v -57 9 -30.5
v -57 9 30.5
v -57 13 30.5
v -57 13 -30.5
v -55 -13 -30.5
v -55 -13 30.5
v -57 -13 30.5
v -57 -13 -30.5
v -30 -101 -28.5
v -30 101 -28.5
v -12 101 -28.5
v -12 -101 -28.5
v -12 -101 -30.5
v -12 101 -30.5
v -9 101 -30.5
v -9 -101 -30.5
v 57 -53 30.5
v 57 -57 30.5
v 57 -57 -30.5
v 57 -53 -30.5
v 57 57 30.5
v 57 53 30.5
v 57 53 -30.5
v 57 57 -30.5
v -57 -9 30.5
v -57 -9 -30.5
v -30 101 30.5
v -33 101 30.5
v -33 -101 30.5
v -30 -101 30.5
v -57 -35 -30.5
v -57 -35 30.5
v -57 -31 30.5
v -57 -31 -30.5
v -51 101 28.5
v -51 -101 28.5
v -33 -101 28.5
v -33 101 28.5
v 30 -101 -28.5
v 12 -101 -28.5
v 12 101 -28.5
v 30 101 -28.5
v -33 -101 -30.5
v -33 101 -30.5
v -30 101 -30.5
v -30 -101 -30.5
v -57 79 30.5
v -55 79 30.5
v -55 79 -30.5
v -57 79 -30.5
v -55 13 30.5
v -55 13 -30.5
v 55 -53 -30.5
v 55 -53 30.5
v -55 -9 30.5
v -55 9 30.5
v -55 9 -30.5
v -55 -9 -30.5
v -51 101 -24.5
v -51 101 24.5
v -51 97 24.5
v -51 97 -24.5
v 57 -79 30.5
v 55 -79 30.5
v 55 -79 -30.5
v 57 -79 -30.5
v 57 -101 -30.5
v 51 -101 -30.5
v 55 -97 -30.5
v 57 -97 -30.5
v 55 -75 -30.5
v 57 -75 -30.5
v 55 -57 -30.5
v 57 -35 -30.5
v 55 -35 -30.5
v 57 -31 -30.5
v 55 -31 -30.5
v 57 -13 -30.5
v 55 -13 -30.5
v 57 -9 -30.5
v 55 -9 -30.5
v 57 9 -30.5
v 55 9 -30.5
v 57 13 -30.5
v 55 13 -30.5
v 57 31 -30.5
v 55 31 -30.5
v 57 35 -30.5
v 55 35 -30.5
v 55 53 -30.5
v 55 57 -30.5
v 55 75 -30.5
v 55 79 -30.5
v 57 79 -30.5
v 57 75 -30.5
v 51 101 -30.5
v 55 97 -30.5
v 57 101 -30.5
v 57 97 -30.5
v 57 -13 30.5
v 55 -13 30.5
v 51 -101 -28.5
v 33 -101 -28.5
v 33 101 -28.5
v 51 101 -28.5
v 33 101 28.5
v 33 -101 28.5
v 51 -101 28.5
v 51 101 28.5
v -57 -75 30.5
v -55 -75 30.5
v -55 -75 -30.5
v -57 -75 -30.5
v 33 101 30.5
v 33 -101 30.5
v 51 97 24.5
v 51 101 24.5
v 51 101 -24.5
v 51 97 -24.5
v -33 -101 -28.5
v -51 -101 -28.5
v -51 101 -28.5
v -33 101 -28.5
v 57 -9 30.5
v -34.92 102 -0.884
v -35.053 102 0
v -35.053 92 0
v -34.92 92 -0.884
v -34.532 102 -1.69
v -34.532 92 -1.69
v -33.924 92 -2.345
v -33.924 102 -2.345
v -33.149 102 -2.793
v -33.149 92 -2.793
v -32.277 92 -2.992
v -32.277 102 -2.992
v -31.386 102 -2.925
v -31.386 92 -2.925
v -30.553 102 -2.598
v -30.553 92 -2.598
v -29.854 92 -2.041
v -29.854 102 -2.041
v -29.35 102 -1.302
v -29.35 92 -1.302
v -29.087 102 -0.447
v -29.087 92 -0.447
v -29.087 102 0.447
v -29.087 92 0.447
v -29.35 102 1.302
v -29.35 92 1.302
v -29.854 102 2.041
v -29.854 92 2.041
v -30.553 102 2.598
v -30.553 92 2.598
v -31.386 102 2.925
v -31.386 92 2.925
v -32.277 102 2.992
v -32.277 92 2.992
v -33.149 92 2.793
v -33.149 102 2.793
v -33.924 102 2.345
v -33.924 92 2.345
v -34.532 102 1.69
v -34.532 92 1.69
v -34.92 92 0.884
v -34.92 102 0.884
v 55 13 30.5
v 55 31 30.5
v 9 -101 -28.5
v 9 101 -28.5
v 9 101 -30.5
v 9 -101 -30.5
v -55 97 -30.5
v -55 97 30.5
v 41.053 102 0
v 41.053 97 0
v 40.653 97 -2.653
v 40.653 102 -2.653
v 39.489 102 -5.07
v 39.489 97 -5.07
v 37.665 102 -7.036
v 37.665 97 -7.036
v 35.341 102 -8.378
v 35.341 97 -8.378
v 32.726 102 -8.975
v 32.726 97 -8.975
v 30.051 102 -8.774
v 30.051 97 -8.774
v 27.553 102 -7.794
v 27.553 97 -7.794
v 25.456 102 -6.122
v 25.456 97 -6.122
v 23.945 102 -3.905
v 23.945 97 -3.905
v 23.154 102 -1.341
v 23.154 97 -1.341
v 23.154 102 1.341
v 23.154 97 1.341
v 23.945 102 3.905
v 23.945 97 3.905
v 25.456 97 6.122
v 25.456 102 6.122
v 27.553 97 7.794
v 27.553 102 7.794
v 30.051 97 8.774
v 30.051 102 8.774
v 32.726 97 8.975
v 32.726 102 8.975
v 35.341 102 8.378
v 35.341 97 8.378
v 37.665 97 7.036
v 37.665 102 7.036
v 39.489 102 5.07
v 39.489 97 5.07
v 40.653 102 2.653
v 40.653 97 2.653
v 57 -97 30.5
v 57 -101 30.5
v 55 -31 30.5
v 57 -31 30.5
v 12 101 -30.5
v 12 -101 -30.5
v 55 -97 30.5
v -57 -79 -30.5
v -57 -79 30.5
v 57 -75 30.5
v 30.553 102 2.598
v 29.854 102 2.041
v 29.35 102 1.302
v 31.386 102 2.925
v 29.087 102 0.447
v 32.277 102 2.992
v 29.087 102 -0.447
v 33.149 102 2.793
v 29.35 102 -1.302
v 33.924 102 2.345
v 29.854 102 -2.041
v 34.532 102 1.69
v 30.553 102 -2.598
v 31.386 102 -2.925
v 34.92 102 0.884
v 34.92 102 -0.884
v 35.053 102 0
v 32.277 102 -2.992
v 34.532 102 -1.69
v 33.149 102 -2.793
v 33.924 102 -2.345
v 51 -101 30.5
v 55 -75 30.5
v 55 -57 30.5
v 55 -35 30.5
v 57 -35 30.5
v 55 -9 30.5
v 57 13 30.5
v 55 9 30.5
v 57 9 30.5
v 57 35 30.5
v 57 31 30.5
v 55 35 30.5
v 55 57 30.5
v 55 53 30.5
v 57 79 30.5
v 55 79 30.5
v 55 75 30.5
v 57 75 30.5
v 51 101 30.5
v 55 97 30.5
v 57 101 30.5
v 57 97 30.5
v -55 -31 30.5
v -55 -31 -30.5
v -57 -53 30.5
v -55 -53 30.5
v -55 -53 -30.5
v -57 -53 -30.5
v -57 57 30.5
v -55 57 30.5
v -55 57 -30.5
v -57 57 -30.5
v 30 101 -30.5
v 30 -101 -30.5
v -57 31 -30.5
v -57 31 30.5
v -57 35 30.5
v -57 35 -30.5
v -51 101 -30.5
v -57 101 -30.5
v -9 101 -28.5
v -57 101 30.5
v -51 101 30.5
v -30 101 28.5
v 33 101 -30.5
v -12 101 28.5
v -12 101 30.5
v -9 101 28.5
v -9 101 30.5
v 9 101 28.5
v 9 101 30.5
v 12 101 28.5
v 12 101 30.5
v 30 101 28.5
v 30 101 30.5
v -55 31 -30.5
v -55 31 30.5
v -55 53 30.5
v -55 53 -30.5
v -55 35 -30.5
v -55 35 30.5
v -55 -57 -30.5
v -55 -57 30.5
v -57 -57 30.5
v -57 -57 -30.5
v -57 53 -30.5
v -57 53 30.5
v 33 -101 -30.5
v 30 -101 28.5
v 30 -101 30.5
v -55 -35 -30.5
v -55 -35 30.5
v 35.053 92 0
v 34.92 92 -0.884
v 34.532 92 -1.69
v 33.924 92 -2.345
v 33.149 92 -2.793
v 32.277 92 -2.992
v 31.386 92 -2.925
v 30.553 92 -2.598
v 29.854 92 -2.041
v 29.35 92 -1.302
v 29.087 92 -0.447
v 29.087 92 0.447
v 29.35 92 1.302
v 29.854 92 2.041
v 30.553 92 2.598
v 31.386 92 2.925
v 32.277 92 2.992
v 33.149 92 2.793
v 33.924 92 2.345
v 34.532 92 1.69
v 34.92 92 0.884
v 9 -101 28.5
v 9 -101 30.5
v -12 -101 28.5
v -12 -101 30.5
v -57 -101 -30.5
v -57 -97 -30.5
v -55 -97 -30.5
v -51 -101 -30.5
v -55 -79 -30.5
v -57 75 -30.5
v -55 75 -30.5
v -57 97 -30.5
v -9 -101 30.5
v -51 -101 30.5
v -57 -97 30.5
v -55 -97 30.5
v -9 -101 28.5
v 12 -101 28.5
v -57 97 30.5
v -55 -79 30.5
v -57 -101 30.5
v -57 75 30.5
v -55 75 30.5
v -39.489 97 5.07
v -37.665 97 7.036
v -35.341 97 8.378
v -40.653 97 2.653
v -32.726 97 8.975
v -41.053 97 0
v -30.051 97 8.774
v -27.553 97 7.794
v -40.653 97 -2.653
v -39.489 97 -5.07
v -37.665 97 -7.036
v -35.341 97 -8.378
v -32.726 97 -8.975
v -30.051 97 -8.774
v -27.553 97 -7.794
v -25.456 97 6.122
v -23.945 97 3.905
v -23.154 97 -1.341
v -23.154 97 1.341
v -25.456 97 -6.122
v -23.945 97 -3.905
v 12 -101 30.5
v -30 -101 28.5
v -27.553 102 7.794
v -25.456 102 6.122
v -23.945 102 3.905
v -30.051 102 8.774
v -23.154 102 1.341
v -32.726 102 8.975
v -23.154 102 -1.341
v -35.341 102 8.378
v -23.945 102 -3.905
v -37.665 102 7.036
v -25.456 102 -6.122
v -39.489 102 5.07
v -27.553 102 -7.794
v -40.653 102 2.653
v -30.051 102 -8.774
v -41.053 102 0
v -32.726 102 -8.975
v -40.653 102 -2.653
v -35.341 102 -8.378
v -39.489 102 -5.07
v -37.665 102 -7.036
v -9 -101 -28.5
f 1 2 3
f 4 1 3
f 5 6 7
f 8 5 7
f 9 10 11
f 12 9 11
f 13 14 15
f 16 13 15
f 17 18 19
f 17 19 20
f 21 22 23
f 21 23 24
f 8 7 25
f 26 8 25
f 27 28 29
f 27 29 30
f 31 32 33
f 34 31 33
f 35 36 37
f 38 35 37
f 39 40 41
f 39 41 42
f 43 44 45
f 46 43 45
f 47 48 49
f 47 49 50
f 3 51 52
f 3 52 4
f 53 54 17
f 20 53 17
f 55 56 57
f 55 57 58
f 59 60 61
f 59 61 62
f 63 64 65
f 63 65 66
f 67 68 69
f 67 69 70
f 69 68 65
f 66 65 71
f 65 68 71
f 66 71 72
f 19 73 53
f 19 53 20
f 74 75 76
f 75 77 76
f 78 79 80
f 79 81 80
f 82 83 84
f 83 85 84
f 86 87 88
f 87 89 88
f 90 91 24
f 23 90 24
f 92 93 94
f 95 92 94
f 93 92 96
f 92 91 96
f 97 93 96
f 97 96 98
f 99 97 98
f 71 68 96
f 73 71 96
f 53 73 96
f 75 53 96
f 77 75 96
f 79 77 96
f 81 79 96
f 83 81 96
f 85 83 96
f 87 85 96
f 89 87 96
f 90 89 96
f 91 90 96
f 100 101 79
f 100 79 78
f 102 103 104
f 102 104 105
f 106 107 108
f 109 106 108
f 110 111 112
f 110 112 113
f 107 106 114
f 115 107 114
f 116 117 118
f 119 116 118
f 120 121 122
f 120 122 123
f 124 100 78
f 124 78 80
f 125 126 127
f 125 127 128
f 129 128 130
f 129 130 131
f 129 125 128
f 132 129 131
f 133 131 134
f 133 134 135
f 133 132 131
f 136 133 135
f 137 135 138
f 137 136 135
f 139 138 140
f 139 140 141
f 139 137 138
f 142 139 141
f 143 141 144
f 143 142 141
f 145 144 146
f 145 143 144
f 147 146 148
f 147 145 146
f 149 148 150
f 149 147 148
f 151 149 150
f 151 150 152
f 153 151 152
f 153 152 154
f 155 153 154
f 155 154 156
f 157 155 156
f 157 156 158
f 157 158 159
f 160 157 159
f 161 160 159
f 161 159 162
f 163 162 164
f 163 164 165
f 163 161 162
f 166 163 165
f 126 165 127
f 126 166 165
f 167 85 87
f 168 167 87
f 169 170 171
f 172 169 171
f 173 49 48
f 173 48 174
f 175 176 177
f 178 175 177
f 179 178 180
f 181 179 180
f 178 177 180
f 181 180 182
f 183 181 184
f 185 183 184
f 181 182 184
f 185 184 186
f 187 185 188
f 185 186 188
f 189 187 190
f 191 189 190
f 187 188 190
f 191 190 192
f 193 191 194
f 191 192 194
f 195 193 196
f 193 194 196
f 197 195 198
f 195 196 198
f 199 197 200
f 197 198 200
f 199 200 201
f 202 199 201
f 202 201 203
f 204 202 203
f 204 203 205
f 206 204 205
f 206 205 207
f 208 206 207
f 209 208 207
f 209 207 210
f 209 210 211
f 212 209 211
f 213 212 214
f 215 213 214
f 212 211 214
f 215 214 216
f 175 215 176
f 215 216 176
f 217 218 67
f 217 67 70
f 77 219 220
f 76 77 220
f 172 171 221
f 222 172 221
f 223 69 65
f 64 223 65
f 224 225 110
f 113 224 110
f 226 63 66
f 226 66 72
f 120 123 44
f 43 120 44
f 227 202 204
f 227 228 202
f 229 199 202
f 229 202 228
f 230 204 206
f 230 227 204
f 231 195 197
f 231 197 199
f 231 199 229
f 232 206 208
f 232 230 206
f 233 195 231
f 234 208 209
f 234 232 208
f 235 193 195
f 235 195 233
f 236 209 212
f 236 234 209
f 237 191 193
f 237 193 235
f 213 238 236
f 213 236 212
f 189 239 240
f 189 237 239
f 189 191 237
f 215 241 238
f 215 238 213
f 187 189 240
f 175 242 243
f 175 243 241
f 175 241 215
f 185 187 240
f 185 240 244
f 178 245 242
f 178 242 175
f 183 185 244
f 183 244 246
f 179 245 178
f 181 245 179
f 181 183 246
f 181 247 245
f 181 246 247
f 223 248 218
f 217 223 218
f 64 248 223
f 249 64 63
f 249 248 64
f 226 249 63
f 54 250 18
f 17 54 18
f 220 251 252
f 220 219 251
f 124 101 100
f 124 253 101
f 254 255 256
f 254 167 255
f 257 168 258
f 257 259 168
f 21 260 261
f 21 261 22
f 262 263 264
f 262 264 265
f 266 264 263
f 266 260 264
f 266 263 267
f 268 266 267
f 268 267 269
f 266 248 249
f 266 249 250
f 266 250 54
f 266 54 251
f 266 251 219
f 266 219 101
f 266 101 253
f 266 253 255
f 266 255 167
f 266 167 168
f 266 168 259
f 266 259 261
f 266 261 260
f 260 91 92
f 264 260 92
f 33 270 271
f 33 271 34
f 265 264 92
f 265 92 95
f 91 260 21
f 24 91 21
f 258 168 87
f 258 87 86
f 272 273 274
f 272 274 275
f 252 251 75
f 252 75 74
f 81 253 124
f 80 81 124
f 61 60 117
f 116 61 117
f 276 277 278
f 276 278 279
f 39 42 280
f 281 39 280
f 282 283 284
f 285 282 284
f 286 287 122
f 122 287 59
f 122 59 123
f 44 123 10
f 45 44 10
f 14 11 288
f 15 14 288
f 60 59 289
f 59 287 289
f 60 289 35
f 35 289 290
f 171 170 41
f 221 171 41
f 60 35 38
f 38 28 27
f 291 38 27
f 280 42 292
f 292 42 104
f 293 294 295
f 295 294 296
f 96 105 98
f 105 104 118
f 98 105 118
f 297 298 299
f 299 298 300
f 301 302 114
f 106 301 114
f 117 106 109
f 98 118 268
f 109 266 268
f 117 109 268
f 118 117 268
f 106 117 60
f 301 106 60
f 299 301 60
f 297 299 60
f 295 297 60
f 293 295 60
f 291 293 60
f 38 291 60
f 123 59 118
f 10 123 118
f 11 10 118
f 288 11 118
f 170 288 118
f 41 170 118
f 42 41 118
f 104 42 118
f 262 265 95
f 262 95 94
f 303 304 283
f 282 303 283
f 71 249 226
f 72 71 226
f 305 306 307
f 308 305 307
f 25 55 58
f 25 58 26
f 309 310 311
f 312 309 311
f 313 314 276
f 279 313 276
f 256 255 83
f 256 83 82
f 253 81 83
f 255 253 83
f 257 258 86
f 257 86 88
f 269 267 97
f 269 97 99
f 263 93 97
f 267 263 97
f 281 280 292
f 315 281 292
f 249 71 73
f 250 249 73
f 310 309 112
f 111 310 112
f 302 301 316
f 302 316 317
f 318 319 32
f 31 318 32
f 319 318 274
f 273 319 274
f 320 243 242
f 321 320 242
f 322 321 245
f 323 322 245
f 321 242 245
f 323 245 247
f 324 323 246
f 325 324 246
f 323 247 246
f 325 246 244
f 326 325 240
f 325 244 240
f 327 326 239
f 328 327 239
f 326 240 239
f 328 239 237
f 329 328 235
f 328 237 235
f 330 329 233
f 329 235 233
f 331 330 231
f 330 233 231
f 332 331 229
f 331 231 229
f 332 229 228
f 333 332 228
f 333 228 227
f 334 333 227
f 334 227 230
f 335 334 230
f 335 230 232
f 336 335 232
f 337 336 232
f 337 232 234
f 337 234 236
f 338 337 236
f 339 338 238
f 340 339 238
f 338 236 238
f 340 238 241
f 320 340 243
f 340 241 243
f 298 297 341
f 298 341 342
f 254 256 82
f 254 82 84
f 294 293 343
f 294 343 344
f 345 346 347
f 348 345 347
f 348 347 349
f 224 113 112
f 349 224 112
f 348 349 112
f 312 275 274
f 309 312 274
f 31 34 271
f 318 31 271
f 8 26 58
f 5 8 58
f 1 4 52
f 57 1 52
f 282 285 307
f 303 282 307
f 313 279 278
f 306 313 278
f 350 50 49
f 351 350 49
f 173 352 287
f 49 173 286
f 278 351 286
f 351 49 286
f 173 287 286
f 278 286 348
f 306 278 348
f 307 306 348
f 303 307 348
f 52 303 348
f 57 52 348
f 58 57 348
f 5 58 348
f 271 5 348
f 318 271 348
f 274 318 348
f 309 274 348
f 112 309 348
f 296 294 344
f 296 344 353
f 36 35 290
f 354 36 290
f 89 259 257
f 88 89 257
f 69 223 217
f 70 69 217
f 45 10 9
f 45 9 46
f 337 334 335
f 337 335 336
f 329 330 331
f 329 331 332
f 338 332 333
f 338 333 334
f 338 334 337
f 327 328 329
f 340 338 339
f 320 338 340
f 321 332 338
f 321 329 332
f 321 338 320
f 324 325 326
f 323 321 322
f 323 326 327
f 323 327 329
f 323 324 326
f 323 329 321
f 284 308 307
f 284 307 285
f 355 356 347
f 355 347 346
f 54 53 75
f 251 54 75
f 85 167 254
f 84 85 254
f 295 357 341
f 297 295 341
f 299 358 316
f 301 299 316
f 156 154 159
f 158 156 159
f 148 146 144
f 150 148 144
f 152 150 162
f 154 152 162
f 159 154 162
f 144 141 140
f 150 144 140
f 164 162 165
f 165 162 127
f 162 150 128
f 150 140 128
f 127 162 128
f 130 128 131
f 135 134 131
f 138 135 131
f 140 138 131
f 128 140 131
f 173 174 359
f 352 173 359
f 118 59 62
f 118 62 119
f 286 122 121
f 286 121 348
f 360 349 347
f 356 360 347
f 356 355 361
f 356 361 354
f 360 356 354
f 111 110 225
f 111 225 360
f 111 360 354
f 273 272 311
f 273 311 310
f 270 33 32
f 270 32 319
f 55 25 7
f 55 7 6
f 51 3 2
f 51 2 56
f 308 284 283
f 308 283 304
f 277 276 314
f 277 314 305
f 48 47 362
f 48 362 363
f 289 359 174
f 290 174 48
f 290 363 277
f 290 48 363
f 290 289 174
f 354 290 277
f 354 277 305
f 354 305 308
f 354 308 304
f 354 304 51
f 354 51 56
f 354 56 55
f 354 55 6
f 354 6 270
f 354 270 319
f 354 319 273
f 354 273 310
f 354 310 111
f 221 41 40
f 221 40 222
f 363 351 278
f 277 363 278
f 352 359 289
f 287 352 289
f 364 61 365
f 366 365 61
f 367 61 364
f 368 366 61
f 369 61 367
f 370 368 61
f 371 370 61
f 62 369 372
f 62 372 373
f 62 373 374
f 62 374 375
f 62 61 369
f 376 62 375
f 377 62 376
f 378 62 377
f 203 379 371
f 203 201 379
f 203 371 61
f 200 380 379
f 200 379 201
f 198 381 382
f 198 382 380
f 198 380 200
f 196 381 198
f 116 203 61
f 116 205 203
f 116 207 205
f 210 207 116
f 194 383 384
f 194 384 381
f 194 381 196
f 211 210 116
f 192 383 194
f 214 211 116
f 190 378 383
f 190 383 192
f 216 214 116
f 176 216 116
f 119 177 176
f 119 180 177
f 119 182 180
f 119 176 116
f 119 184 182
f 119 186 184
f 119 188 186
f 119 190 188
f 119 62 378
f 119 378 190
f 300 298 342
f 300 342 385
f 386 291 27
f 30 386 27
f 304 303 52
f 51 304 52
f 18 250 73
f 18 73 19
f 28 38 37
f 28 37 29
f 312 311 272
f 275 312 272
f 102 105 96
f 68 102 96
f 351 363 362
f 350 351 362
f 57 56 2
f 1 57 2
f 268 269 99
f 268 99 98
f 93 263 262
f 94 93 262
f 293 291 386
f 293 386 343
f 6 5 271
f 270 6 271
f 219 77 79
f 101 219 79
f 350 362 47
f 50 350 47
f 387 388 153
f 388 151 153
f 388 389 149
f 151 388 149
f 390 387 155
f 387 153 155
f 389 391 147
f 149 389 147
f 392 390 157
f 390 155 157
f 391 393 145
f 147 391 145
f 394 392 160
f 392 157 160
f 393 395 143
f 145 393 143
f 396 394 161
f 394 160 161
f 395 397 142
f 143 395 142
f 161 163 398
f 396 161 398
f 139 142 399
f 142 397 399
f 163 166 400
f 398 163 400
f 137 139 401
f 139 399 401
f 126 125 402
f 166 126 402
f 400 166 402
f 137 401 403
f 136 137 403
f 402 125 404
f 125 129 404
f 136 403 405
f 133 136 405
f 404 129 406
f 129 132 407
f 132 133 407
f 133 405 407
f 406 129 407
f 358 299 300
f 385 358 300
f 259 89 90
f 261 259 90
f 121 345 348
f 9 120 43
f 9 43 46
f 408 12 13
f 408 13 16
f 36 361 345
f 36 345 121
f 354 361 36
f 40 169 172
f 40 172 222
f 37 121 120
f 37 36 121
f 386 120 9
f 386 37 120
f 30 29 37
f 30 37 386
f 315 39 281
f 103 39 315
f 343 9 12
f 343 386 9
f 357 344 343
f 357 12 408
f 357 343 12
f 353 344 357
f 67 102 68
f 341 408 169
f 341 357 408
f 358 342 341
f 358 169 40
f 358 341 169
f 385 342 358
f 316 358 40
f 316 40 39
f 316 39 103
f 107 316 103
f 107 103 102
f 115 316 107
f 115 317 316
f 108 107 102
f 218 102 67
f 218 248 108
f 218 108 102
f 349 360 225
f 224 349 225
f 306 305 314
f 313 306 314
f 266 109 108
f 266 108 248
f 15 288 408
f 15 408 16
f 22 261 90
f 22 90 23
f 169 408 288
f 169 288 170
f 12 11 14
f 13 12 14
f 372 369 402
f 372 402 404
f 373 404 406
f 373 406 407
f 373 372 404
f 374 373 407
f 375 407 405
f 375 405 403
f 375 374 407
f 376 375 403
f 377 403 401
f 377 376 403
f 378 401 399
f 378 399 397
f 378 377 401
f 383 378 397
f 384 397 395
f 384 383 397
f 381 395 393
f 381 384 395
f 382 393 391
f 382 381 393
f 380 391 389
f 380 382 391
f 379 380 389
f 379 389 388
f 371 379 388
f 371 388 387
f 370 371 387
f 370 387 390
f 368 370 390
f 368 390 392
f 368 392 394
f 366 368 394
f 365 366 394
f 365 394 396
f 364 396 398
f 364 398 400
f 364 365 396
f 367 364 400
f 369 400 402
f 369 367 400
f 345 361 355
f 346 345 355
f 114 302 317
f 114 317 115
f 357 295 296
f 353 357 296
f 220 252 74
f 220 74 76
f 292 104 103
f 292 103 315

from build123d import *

# Parameters (mm, degrees)
CROQUIS1_W                = 114
CROQUIS1_H                = 202
SALIENTE_EXTRUIR1_DEPTH   = 30.5
CROQUIS2_W                = 2
CROQUIS2_H                = 18
CORTAR_EXTRUIR1_DEPTH     = 62
MATRIZL1_COUNT            = 9
MATRIZL1_PITCH            = 22
SIMETR_A1_COPY_1_SKETCH_W = 2
SIMETR_A1_COPY_1_SKETCH_H = 18
SIMETR_A1_COPY_1_DEPTH    = 62
SIMETR_A1_COPY_2_SKETCH_W = 2
SIMETR_A1_COPY_2_SKETCH_H = 18
SIMETR_A1_COPY_2_DEPTH    = 62
SIMETR_A1_COPY_3_SKETCH_W = 2
SIMETR_A1_COPY_3_SKETCH_H = 18
SIMETR_A1_COPY_3_DEPTH    = 62
SIMETR_A1_COPY_4_SKETCH_W = 2
SIMETR_A1_COPY_4_SKETCH_H = 18
SIMETR_A1_COPY_4_DEPTH    = 62
SIMETR_A1_COPY_5_SKETCH_W = 2
SIMETR_A1_COPY_5_SKETCH_H = 18
SIMETR_A1_COPY_5_DEPTH    = 62
SIMETR_A1_COPY_6_SKETCH_W = 2
SIMETR_A1_COPY_6_SKETCH_H = 18
SIMETR_A1_COPY_6_DEPTH    = 62
SIMETR_A1_COPY_7_SKETCH_W = 2
SIMETR_A1_COPY_7_SKETCH_H = 18
SIMETR_A1_COPY_7_DEPTH    = 62
SIMETR_A1_COPY_8_SKETCH_W = 2
SIMETR_A1_COPY_8_SKETCH_H = 18
SIMETR_A1_COPY_8_DEPTH    = 62
CROQUIS3_W                = 18
CROQUIS3_H                = 2
CORTAR_EXTRUIR2_DEPTH     = 203
CROQUIS4_W                = 102
CROQUIS4_H                = 49
CORTAR_EXTRUIR3_DEPTH     = 4
CROQUIS5_R                = 9
SALIENTE_EXTRUIR2_DEPTH   = 5
CROQUIS6_R                = 3
CORTAR_EXTRUIR4_DEPTH     = 10


with BuildPart() as part:
    # Croquis1 → Saliente-Extruir1 (new body, symmetric)
    with BuildSketch(Plane.XY):
        Rectangle(CROQUIS1_W, CROQUIS1_H)
    extrude(amount=SALIENTE_EXTRUIR1_DEPTH, both=True)

    # Croquis2 → Cortar-Extruir1 (cut, through all)
    with BuildSketch(Plane.XY.offset(30.5)):
        with Locations((56, 88)):
            Rectangle(CROQUIS2_W, CROQUIS2_H)
    cortar_extruir1 = extrude(amount=-CORTAR_EXTRUIR1_DEPTH, mode=Mode.SUBTRACT)

    # MatrizL1: Cortar-Extruir1 ×9
    with Locations(*[(0, -i * MATRIZL1_PITCH, 0) for i in range(1, MATRIZL1_COUNT)]):
        add(cortar_extruir1, mode=Mode.SUBTRACT)

    # Simetría1: Cortar-Extruir1 across plane
    add(cortar_extruir1.mirror(Plane(origin=(0, 0, 0), x_dir=(0, 0, 1), z_dir=(1, 0, 0))), mode=Mode.SUBTRACT)

    # Simetría1 copy 1 sketch → Simetría1 copy 1 (cut, through all)
    with BuildSketch(Plane(origin=(0, -22, 30.5), x_dir=(-1, 0, 0), z_dir=(0, 0, 1))):
        with Locations((56, -88)):
            Rectangle(SIMETR_A1_COPY_1_SKETCH_W, SIMETR_A1_COPY_1_SKETCH_H)
    extrude(amount=-SIMETR_A1_COPY_1_DEPTH, mode=Mode.SUBTRACT)

    # Simetría1 copy 2 sketch → Simetría1 copy 2 (cut, through all)
    with BuildSketch(Plane(origin=(0, -44, 30.5), x_dir=(-1, 0, 0), z_dir=(0, 0, 1))):
        with Locations((56, -88)):
            Rectangle(SIMETR_A1_COPY_2_SKETCH_W, SIMETR_A1_COPY_2_SKETCH_H)
    extrude(amount=-SIMETR_A1_COPY_2_DEPTH, mode=Mode.SUBTRACT)

    # Simetría1 copy 3 sketch → Simetría1 copy 3 (cut, through all)
    with BuildSketch(Plane(origin=(0, -66, 30.5), x_dir=(-1, 0, 0), z_dir=(0, 0, 1))):
        with Locations((56, -88)):
            Rectangle(SIMETR_A1_COPY_3_SKETCH_W, SIMETR_A1_COPY_3_SKETCH_H)
    extrude(amount=-SIMETR_A1_COPY_3_DEPTH, mode=Mode.SUBTRACT)

    # Simetría1 copy 4 sketch → Simetría1 copy 4 (cut, through all)
    with BuildSketch(Plane(origin=(0, -88, 30.5), x_dir=(-1, 0, 0), z_dir=(0, 0, 1))):
        with Locations((56, -88)):
            Rectangle(SIMETR_A1_COPY_4_SKETCH_W, SIMETR_A1_COPY_4_SKETCH_H)
    extrude(amount=-SIMETR_A1_COPY_4_DEPTH, mode=Mode.SUBTRACT)

    # Simetría1 copy 5 sketch → Simetría1 copy 5 (cut, through all)
    with BuildSketch(Plane(origin=(0, -110, 30.5), x_dir=(-1, 0, 0), z_dir=(0, 0, 1))):
        with Locations((56, -88)):
            Rectangle(SIMETR_A1_COPY_5_SKETCH_W, SIMETR_A1_COPY_5_SKETCH_H)
    extrude(amount=-SIMETR_A1_COPY_5_DEPTH, mode=Mode.SUBTRACT)

    # Simetría1 copy 6 sketch → Simetría1 copy 6 (cut, through all)
    with BuildSketch(Plane(origin=(0, -132, 30.5), x_dir=(-1, 0, 0), z_dir=(0, 0, 1))):
        with Locations((56, -88)):
            Rectangle(SIMETR_A1_COPY_6_SKETCH_W, SIMETR_A1_COPY_6_SKETCH_H)
    extrude(amount=-SIMETR_A1_COPY_6_DEPTH, mode=Mode.SUBTRACT)

    # Simetría1 copy 7 sketch → Simetría1 copy 7 (cut, through all)
    with BuildSketch(Plane(origin=(0, -154, 30.5), x_dir=(-1, 0, 0), z_dir=(0, 0, 1))):
        with Locations((56, -88)):
            Rectangle(SIMETR_A1_COPY_7_SKETCH_W, SIMETR_A1_COPY_7_SKETCH_H)
    extrude(amount=-SIMETR_A1_COPY_7_DEPTH, mode=Mode.SUBTRACT)

    # Simetría1 copy 8 sketch → Simetría1 copy 8 (cut, through all)
    with BuildSketch(Plane(origin=(0, -176, 30.5), x_dir=(-1, 0, 0), z_dir=(0, 0, 1))):
        with Locations((56, -88)):
            Rectangle(SIMETR_A1_COPY_8_SKETCH_W, SIMETR_A1_COPY_8_SKETCH_H)
    extrude(amount=-SIMETR_A1_COPY_8_DEPTH, mode=Mode.SUBTRACT)

    # Croquis3 → Cortar-Extruir2 (cut, through all)
    with BuildSketch(Plane(origin=(0, 101, 0), x_dir=(1, 0, 0), z_dir=(0, 1, 0))):
        with Locations((0, 29.5)):
            Rectangle(CROQUIS3_W, CROQUIS3_H)
        with Locations((21, 29.5)):
            Rectangle(CROQUIS3_W, CROQUIS3_H)
        with Locations((42, 29.5)):
            Rectangle(CROQUIS3_W, CROQUIS3_H)
        with Locations((-42, 29.5)):
            Rectangle(CROQUIS3_W, CROQUIS3_H)
        with Locations((-21, 29.5)):
            Rectangle(CROQUIS3_W, CROQUIS3_H)
    cortar_extruir2 = extrude(amount=-CORTAR_EXTRUIR2_DEPTH, mode=Mode.SUBTRACT)

    # Simetría2: Cortar-Extruir2 across plane
    add(cortar_extruir2.mirror(Plane.XY), mode=Mode.SUBTRACT)

    # Croquis4 → Cortar-Extruir3 (cut)
    with BuildSketch(Plane(origin=(0, 101, 0), x_dir=(1, 0, 0), z_dir=(0, 1, 0))):
        Rectangle(CROQUIS4_W, CROQUIS4_H)
    extrude(amount=-CORTAR_EXTRUIR3_DEPTH, mode=Mode.SUBTRACT)

    # Croquis5 → Saliente-Extruir2 (add)
    with BuildSketch(Plane(origin=(0, 97, 0), x_dir=(1, 0, 0), z_dir=(0, 1, 0))):
        with Locations((32.053240518, 0)):
            Circle(CROQUIS5_R)
    saliente_extruir2 = extrude(amount=SALIENTE_EXTRUIR2_DEPTH)

    # Croquis6 → Cortar-Extruir4 (cut)
    with BuildSketch(Plane(origin=(0, 102, 0), x_dir=(1, 0, 0), z_dir=(0, 1, 0))):
        with Locations((32.053240518, 0)):
            Circle(CROQUIS6_R)
    cortar_extruir4 = extrude(amount=-CORTAR_EXTRUIR4_DEPTH, mode=Mode.SUBTRACT)

    # Simetría4: Saliente-Extruir2, Cortar-Extruir4 across plane
    add(saliente_extruir2.mirror(Plane(origin=(0, 0, 0), x_dir=(0, 0, 1), z_dir=(1, 0, 0))))
    add(cortar_extruir4.mirror(Plane(origin=(0, 0, 0), x_dir=(0, 0, 1), z_dir=(1, 0, 0))), mode=Mode.SUBTRACT)


solid = part.part
